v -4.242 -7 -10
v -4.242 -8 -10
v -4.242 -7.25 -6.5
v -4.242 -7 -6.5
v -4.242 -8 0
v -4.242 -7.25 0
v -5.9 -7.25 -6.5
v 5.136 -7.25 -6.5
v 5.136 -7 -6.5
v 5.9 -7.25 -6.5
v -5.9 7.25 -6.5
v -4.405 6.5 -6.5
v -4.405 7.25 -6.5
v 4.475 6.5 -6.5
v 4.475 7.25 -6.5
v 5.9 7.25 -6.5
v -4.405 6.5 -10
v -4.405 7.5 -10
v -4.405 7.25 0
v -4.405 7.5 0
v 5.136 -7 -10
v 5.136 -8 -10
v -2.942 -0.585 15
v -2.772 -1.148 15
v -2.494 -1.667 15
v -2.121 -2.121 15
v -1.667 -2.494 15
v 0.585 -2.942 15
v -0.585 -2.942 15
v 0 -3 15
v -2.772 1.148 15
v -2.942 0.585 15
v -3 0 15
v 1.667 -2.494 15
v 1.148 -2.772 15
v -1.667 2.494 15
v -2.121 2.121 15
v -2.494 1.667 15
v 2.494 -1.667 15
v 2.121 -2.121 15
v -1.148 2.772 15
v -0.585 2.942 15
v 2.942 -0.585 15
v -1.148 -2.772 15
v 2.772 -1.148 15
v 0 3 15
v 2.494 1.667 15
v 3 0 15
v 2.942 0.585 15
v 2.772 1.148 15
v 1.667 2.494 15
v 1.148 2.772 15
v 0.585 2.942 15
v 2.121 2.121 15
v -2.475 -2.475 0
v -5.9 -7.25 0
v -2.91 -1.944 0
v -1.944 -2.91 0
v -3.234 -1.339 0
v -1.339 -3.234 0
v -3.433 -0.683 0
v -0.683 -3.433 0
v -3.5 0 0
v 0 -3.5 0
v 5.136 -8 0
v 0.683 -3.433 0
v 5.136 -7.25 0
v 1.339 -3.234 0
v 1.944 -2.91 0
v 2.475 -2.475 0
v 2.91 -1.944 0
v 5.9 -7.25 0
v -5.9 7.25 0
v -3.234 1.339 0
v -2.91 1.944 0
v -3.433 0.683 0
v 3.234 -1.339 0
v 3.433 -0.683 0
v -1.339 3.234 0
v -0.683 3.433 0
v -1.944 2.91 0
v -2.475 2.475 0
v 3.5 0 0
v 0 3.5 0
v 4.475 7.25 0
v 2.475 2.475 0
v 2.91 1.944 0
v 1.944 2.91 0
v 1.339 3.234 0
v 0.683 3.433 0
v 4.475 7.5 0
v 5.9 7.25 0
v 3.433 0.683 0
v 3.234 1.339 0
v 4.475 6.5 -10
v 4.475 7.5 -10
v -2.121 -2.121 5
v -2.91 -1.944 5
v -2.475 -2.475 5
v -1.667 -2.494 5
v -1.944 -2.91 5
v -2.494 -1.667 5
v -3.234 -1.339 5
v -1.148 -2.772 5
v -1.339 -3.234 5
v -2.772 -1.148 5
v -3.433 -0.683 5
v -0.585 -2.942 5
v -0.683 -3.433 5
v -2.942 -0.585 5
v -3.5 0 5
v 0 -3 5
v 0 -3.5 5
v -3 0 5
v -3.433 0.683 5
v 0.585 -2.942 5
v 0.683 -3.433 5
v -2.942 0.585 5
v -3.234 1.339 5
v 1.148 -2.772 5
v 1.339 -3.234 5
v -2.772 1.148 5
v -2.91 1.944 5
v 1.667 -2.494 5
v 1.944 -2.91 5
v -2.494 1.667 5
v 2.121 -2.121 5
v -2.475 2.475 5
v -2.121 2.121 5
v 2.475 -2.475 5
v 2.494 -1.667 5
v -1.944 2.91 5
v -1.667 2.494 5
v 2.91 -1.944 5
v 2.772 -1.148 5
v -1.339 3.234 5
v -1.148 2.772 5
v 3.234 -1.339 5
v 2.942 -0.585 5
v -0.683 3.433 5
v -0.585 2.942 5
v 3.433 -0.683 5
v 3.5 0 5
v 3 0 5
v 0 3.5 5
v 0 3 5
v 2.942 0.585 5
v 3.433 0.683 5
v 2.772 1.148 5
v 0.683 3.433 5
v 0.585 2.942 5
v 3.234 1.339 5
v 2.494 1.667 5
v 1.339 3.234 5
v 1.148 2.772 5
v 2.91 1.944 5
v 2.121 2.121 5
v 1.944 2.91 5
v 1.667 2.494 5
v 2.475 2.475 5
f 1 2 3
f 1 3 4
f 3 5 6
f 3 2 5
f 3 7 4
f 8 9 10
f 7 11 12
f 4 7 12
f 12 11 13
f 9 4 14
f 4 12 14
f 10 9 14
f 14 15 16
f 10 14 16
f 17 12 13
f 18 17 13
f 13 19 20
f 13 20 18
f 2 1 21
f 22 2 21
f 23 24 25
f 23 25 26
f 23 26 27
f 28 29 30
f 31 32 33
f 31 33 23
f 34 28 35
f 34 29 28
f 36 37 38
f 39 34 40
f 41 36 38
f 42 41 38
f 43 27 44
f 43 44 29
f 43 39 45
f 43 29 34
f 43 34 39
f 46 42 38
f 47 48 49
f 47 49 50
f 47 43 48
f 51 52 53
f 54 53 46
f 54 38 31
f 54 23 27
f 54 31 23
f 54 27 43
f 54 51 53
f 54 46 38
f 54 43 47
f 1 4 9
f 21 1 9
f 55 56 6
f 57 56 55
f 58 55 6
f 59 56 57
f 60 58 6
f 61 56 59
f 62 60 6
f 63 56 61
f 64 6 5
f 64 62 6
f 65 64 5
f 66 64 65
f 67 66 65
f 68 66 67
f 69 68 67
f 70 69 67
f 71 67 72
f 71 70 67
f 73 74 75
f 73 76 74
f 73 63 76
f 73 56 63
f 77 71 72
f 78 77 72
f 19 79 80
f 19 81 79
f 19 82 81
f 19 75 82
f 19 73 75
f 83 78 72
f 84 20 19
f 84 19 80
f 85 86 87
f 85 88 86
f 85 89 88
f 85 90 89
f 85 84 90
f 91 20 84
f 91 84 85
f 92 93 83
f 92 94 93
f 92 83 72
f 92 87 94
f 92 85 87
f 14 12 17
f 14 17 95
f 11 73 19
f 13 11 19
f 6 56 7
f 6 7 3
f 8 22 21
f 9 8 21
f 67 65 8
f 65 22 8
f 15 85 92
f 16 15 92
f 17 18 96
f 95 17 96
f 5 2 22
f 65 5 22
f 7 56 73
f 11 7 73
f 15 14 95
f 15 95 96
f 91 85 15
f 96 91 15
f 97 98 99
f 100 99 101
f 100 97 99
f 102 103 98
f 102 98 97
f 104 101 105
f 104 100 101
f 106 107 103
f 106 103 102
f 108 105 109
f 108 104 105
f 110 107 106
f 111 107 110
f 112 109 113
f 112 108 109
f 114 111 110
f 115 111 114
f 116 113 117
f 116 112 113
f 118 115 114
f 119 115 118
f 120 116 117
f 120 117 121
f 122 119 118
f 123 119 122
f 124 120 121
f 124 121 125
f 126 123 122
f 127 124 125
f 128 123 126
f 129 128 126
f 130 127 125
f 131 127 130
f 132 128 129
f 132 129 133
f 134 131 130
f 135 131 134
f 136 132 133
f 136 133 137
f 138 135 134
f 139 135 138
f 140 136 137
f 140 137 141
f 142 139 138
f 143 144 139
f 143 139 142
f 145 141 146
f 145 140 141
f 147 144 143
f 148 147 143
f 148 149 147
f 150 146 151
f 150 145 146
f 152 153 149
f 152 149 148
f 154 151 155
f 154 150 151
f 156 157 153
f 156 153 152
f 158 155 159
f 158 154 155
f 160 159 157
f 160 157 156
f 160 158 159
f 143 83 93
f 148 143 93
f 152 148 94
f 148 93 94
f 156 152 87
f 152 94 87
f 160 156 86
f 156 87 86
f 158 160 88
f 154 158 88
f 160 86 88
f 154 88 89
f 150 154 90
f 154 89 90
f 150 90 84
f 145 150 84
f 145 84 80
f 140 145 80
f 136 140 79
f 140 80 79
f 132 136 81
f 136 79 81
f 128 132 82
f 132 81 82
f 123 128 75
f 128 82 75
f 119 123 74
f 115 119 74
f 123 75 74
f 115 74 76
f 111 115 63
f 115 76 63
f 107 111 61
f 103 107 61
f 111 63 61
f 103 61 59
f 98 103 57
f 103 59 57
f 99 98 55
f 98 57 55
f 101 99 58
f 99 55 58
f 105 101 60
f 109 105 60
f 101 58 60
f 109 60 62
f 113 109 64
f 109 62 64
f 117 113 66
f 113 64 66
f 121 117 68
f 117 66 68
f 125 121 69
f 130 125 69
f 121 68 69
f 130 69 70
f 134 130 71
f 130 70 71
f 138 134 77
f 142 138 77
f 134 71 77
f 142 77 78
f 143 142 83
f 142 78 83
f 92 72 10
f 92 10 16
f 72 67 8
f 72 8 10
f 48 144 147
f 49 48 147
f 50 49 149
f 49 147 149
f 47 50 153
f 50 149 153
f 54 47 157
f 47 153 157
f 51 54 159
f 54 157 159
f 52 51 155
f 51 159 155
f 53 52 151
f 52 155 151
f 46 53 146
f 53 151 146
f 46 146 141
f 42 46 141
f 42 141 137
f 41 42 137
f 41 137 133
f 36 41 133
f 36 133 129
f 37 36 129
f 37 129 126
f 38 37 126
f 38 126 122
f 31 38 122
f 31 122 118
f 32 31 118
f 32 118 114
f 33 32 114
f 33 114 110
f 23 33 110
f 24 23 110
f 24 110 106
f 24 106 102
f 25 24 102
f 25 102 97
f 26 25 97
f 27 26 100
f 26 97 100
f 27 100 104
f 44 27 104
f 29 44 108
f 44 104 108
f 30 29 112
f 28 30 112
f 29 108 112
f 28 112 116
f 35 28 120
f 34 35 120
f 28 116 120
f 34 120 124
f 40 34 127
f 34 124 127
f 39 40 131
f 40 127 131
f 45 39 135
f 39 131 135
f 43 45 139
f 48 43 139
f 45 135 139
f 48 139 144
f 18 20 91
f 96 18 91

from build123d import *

# Parameters (mm, degrees)
SKETCH012_W   = 11.8
SKETCH012_H   = 14.5
PAD009_DEPTH  = 6.5
SKETCH013_R   = 3.5
PAD010_DEPTH  = 5
SKETCH014_R   = 3
PAD011_DEPTH  = 15
SKETCH015_W   = 8.880223
SKETCH015_H   = 1
SKETCH015_W_2 = 9.377943
PAD012_DEPTH  = 10


with BuildPart() as part:
    # Sketch012 → Pad009 (new body)
    with BuildSketch(Plane.XY):
        Rectangle(SKETCH012_W, SKETCH012_H)
    extrude(amount=-PAD009_DEPTH)

    # Sketch013 → Pad010 (join)
    with BuildSketch(Plane.XY):
        Circle(SKETCH013_R)
    extrude(amount=PAD010_DEPTH)

    # Sketch014 → Pad011 (join)
    with BuildSketch(Plane.XY):
        Circle(SKETCH014_R)
    extrude(amount=PAD011_DEPTH)

    # Sketch015 → Pad012 (join)
    with BuildSketch(Plane.XY):
        with Locations((0.034908, 7)):
            Rectangle(SKETCH015_W, SKETCH015_H)
        with Locations((0.447315, -7.5)):
            Rectangle(SKETCH015_W_2, SKETCH015_H)
    extrude(amount=-PAD012_DEPTH)


solid = part.part
